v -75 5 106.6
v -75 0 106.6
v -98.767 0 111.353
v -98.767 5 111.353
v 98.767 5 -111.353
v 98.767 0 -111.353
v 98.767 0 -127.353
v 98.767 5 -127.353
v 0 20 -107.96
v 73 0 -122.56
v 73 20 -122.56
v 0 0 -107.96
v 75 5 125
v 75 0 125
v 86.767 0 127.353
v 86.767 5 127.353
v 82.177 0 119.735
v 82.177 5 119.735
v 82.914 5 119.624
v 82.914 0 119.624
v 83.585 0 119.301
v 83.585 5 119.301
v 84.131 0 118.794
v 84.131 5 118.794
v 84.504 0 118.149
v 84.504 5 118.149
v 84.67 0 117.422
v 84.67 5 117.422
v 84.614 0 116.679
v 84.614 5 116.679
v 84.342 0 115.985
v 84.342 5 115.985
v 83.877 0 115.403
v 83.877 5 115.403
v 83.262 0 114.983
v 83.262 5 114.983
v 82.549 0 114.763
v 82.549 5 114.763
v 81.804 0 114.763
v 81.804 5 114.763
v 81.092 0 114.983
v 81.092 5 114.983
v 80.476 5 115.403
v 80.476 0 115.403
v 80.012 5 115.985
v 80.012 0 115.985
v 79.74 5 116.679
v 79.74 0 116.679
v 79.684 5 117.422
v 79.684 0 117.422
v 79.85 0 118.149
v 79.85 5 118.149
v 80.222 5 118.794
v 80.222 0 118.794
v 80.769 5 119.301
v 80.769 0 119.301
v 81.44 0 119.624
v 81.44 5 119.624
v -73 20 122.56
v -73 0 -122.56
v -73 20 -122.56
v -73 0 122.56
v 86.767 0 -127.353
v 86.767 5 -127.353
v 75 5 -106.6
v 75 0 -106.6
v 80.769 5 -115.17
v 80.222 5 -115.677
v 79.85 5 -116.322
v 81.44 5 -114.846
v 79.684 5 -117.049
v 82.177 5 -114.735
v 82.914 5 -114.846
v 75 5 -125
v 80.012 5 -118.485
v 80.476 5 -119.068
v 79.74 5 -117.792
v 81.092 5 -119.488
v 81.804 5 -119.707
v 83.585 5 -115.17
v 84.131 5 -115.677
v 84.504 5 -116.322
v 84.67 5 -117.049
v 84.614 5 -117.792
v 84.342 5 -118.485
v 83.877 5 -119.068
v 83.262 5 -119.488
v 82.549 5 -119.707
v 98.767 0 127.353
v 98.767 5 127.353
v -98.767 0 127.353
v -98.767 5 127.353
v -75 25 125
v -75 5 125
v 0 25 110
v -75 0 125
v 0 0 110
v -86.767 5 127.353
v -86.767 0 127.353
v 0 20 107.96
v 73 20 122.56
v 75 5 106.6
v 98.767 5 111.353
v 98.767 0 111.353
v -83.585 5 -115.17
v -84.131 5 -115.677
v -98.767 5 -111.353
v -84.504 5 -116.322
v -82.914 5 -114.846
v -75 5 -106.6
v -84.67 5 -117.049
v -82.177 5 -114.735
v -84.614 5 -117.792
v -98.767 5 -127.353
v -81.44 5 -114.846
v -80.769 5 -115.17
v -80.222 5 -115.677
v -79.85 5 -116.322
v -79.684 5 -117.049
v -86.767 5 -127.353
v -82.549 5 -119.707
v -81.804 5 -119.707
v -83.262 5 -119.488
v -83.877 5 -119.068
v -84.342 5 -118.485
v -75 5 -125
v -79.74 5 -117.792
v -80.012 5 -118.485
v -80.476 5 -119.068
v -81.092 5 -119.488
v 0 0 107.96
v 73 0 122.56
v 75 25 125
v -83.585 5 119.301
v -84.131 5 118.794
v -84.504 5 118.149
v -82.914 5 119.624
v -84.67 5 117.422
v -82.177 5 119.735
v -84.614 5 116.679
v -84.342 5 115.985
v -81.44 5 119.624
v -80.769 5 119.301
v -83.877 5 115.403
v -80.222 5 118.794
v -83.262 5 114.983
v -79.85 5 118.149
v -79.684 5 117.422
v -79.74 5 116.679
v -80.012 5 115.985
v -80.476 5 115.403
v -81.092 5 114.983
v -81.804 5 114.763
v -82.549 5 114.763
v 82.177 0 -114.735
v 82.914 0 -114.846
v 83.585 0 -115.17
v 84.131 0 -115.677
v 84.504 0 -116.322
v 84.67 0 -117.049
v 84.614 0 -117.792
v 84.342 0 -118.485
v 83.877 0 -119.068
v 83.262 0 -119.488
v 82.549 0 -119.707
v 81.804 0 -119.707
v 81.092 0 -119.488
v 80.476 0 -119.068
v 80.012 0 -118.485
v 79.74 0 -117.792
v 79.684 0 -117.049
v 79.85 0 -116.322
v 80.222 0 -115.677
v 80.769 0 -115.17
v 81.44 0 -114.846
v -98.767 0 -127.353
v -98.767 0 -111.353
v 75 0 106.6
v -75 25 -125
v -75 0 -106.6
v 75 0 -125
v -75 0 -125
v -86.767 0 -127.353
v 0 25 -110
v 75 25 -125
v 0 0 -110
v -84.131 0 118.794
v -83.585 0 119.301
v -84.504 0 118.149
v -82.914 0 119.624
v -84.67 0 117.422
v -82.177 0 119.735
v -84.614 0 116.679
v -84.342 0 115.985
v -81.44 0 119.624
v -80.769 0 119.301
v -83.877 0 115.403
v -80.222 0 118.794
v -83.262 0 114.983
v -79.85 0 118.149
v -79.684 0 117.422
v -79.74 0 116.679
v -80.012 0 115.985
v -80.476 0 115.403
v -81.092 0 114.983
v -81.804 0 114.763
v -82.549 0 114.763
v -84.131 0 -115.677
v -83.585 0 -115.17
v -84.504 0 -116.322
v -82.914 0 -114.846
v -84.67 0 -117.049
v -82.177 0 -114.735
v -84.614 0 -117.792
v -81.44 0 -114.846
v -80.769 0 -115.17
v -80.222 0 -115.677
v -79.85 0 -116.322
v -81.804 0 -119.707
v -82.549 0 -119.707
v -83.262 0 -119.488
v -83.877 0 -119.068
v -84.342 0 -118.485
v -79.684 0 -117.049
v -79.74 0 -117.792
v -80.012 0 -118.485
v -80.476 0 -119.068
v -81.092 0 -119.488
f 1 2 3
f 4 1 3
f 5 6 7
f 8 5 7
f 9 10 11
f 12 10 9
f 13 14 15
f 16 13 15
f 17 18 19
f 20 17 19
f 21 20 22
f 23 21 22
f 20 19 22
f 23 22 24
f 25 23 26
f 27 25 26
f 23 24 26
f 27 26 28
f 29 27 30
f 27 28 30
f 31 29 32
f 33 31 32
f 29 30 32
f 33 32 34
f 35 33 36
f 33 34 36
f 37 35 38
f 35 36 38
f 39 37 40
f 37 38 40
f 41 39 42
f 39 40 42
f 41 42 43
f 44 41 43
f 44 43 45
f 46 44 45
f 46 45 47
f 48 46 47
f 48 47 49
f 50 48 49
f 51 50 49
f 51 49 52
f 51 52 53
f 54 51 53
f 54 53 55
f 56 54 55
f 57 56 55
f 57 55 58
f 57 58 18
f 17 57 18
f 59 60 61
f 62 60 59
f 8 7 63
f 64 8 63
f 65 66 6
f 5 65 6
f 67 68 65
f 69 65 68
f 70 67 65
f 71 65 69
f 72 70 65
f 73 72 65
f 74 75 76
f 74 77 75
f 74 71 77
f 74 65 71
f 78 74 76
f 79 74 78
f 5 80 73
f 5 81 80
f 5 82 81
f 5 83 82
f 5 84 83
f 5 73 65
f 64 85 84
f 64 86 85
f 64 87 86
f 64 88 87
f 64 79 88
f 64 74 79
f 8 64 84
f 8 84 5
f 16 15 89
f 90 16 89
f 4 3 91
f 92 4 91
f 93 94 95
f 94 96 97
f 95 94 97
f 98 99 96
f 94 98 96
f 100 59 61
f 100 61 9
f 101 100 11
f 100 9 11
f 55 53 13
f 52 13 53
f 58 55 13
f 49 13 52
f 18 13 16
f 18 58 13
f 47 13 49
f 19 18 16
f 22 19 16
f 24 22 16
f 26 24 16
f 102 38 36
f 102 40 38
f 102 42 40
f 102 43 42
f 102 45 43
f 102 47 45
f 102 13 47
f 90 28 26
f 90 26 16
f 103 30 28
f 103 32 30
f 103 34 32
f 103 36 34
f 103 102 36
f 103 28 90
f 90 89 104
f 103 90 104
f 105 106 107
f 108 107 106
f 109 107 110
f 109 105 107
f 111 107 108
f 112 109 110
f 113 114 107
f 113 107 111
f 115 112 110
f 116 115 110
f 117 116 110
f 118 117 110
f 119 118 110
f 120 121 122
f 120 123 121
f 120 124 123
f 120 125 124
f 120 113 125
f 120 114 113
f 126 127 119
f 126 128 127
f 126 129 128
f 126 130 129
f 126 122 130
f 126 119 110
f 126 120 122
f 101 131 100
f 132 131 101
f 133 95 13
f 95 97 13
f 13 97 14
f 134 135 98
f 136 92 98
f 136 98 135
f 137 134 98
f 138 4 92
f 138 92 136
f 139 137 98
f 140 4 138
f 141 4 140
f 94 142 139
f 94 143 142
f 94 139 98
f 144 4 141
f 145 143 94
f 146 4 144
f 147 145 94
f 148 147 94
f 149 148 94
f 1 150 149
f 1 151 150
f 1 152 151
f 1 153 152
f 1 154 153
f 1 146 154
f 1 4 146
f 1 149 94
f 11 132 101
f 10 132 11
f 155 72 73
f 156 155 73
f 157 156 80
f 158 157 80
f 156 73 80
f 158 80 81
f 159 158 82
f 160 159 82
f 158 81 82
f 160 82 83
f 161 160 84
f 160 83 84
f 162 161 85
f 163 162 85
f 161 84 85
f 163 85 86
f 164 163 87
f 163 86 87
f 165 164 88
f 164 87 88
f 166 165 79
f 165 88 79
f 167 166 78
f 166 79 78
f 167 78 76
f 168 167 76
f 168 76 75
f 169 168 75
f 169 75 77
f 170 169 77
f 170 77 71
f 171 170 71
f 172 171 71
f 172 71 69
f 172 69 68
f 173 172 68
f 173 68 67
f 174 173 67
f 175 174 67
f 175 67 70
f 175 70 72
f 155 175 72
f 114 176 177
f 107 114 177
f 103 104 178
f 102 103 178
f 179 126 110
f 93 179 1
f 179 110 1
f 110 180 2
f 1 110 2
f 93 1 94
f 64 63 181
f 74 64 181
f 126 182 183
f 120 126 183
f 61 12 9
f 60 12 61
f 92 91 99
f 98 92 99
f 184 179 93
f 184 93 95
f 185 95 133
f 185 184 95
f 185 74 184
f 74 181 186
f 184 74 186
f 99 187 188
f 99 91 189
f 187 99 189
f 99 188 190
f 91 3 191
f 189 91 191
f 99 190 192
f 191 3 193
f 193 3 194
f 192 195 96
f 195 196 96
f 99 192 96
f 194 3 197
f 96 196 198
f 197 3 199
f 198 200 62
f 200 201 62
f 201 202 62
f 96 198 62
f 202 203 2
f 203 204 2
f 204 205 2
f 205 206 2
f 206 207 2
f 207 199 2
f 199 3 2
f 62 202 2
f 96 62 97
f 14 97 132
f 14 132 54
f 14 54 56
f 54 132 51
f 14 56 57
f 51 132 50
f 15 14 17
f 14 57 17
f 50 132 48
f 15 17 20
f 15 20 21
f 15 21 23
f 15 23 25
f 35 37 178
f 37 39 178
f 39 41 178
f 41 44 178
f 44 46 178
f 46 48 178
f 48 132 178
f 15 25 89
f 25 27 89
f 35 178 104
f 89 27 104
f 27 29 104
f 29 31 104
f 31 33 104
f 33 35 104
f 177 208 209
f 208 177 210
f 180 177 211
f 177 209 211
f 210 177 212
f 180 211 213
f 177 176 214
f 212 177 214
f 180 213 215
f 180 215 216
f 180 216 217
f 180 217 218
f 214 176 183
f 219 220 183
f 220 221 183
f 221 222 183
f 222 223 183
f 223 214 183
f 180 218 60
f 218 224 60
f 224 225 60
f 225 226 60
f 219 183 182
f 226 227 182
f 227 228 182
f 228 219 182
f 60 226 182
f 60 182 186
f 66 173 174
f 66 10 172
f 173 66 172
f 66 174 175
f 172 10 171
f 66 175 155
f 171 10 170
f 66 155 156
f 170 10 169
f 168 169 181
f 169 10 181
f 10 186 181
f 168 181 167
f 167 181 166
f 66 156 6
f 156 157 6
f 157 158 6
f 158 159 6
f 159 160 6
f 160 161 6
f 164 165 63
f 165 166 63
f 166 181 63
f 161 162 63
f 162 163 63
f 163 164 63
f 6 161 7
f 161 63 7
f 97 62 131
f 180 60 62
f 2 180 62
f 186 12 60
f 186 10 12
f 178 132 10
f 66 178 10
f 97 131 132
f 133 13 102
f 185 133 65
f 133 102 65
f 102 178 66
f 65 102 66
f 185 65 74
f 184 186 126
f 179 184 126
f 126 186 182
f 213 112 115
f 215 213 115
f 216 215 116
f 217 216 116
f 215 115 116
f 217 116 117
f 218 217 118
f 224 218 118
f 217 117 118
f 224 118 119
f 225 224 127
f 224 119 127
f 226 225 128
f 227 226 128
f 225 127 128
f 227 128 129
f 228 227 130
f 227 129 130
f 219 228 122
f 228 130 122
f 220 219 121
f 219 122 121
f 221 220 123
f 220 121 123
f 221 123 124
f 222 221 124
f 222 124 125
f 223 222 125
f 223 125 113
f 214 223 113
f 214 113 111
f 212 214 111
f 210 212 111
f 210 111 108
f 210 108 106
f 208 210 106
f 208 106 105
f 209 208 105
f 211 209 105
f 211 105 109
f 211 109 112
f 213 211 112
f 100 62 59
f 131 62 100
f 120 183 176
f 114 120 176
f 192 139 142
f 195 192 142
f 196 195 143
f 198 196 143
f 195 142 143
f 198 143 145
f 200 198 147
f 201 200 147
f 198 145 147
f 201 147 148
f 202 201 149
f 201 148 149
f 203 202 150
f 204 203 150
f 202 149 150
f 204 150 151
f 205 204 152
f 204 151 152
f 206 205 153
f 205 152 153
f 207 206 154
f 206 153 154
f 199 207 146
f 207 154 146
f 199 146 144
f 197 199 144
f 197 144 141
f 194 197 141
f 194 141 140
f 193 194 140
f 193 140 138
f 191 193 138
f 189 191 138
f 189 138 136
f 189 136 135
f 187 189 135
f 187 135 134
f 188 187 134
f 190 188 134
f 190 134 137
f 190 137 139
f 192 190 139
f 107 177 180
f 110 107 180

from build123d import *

# Parameters (mm, degrees)
BOSS_EXTRUDE1_DEPTH = 5
SKETCH3_R           = 2.5
CUT_EXTRUDE1_DEPTH  = 162.241436536
BOSS_EXTRUDE2_DEPTH = 20
BOSS_EXTRUDE3_DEPTH = 5


with BuildPart() as part:
    # Sketch1 → Boss-Extrude1 (new body)
    with BuildSketch(Plane(origin=(0, 0, 0), x_dir=(1, 0, 0), z_dir=(0, 1, 0))):
        Polygon((-75, 106.6), (-75, -106.6), (-98.766968108, -111.353393622), (-98.766968108, -127.353393622), (-86.766968108, -127.353393622), (-75, -125), (0, -110), (75, -125), (86.766968108, -127.353393622), (98.766968108, -127.353393622), (98.766968108, -111.353393622), (75, -106.6), (75, 106.6), (98.766968108, 111.353393622), (98.766968108, 127.353393622), (86.766968108, 127.353393622), (75, 125), (0, 110), (-75, 125), (-86.766968108, 127.353393622), (-98.766968108, 127.353393622), (-98.766968108, 111.353393622), align=None)
    extrude(amount=BOSS_EXTRUDE1_DEPTH)

    # Sketch3 → Cut-Extrude1 (cut, through all)
    with BuildSketch(Plane(origin=(0, 5, 0), x_dir=(1, 0, 0), z_dir=(0, 1, 0))):
        Polygon((-73, 122.560392195), (-73, -122.560392195), (0, -107.960392195), (73, -122.560392195), (73, 122.560392195), (0, 107.960392195), align=None)
        with Locations((82.176846176, -117.235369235)):
            Circle(SKETCH3_R)
        with Locations((-82.176846176, -117.235369235)):
            Circle(SKETCH3_R)
        with Locations((-82.176846176, 117.235369235)):
            Circle(SKETCH3_R)
        with Locations((82.176846176, 117.235369235)):
            Circle(SKETCH3_R)
    extrude(amount=-CUT_EXTRUDE1_DEPTH, mode=Mode.SUBTRACT)

    # Sketch4 → Boss-Extrude2 (add)
    with BuildSketch(Plane(origin=(0, 5, 0), x_dir=(1, 0, 0), z_dir=(0, 1, 0))):
        Polygon((-75, 125), (-75, -125), (0, -110), (75, -125), (75, 125), (0, 110), align=None)
        Polygon((0, -107.960392195), (73, -122.560392195), (73, 122.560392195), (0, 107.960392195), (-73, 122.560392195), (-73, -122.560392195), align=None, mode=Mode.SUBTRACT)
    extrude(amount=BOSS_EXTRUDE2_DEPTH)

    # Sketch5 → Boss-Extrude3 (add)
    with BuildSketch(Plane(origin=(0, 25, 0), x_dir=(1, 0, 0), z_dir=(0, 1, 0))):
        Polygon((75, 125), (0, 110), (-75, 125), (-75, -125), (0, -110), (75, -125), align=None)
    extrude(amount=-BOSS_EXTRUDE3_DEPTH)


solid = part.part
